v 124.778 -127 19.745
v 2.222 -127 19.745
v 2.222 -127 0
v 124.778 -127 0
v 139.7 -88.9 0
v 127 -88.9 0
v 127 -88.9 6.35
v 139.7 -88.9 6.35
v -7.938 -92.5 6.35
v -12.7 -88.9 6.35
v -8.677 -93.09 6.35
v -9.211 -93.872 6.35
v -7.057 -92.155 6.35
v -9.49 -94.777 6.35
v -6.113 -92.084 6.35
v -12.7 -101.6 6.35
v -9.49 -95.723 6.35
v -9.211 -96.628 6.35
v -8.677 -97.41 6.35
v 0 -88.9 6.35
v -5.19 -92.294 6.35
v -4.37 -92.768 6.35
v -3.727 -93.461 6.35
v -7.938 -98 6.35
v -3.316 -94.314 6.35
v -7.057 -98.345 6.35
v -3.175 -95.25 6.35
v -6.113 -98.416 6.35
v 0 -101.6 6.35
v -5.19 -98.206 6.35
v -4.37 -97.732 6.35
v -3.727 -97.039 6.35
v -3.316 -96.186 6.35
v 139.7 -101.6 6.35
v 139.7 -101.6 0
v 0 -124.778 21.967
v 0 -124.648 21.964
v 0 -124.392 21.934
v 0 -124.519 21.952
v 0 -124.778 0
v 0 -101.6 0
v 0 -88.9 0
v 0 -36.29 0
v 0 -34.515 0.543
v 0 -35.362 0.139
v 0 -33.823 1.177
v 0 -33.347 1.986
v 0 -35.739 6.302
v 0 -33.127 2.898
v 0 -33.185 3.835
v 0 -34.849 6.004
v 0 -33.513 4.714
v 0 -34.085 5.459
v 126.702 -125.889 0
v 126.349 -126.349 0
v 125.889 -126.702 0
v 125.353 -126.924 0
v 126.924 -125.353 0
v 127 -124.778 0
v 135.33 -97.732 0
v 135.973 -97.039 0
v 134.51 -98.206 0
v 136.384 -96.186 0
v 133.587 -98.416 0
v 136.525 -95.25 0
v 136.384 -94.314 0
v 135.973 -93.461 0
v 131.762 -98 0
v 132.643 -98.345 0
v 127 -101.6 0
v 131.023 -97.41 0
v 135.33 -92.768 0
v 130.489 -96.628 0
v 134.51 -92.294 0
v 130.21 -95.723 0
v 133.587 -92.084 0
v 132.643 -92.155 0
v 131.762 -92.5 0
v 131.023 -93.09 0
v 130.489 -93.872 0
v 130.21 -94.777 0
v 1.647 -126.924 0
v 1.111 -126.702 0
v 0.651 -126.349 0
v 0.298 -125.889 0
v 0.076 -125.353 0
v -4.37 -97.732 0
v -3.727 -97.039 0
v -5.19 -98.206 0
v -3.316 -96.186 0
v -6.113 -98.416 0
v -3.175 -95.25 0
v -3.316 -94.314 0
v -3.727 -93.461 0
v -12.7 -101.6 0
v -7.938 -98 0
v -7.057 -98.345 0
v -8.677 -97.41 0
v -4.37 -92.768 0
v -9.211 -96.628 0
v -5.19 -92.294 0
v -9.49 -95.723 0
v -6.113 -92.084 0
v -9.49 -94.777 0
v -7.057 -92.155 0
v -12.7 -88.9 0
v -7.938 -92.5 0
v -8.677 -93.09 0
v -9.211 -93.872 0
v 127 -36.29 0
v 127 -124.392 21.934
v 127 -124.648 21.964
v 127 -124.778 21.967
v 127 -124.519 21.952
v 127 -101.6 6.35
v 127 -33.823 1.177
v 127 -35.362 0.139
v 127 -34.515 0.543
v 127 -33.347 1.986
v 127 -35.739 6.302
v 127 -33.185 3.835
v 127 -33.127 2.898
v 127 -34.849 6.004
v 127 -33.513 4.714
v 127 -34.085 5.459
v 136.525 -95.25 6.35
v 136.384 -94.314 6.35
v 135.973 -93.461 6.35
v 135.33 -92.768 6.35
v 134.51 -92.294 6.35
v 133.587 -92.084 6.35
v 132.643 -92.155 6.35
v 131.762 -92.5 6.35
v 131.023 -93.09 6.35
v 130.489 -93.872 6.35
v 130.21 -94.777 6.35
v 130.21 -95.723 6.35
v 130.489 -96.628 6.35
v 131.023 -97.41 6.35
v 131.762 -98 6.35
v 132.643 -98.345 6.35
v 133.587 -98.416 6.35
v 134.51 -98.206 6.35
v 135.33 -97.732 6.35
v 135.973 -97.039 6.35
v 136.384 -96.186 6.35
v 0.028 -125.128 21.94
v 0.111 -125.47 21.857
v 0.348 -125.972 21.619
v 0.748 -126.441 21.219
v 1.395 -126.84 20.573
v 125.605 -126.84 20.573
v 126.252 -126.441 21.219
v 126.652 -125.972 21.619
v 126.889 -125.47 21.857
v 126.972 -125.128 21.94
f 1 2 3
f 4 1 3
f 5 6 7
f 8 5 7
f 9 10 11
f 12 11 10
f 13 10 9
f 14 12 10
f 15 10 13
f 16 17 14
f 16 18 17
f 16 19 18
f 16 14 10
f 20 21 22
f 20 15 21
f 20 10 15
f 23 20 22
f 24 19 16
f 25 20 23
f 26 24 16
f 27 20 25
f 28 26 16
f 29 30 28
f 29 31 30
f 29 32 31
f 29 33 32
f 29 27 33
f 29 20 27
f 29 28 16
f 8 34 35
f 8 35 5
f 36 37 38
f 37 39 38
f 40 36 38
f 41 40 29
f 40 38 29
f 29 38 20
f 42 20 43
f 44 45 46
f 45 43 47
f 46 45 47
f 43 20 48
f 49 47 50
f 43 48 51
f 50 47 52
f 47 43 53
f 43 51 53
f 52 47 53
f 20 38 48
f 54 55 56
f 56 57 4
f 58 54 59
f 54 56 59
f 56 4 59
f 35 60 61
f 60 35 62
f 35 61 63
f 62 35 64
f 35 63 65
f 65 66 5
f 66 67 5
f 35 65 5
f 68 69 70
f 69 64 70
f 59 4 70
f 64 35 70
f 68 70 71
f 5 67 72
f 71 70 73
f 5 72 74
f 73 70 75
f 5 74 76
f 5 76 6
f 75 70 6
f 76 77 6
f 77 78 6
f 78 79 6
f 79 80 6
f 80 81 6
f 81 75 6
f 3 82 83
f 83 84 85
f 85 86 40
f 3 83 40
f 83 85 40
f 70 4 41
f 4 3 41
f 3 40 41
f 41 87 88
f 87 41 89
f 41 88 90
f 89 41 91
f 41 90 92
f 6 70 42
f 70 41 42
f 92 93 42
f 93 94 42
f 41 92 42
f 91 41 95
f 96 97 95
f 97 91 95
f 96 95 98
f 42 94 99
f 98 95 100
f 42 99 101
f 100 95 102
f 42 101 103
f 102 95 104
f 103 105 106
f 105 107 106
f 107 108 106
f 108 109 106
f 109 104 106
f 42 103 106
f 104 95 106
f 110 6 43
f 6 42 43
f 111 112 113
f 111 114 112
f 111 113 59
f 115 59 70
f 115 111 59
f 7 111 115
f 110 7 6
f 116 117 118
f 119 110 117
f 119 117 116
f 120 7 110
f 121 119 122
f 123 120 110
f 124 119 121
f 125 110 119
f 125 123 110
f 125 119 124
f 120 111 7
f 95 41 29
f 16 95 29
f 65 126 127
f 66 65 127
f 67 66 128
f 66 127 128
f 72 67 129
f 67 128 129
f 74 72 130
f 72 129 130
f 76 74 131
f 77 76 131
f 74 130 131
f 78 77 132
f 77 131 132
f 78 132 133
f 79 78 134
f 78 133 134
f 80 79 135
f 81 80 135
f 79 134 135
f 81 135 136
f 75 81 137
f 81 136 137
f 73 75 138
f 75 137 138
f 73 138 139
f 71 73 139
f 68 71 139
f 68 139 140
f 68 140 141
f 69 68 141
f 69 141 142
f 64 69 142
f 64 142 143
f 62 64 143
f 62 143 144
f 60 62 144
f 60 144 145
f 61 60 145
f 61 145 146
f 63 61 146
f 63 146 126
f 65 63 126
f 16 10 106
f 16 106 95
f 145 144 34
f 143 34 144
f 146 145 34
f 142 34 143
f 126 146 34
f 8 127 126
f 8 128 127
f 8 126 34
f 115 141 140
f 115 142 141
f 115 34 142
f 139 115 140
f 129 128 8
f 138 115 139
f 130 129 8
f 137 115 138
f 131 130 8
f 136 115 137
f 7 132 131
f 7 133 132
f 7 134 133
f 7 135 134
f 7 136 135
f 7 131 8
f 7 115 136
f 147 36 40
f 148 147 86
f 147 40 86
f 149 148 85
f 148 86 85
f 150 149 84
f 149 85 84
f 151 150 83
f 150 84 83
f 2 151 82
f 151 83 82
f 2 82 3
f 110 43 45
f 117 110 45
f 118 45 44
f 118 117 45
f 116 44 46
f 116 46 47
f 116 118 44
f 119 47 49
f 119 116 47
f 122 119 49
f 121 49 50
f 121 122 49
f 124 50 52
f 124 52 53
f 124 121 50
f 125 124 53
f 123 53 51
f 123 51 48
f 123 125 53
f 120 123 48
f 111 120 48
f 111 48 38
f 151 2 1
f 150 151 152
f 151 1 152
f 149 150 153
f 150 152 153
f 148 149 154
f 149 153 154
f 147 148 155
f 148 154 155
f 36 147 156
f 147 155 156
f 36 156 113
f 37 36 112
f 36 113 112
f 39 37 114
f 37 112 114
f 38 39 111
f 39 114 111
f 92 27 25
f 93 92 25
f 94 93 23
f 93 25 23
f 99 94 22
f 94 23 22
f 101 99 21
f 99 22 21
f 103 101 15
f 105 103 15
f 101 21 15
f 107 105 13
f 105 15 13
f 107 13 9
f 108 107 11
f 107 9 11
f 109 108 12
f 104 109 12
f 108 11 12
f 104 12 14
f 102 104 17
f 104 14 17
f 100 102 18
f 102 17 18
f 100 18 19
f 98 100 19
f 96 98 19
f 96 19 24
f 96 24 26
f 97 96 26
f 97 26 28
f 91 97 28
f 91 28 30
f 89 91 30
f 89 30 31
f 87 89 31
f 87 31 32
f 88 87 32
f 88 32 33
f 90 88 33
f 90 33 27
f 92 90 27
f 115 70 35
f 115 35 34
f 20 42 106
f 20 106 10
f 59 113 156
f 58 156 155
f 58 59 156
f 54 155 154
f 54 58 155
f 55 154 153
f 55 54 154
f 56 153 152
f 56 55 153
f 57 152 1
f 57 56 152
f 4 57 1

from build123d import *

# Parameters (mm, degrees)
F1_DEPTH = 127
F2_W     = 12.7
F2_H     = 6.35
F3_DEPTH = 12.7
F4_W     = 12.7
F4_H     = 6.35
F5_DEPTH = 12.7
F6_R     = 3.175
F7_DEPTH = 6.351
F8_R     = 3.175
F9_DEPTH = 6.351
F10_R    = 3.175
F11_R    = 2.2225


with BuildPart() as f1:
    # F0 (on Right) → F1 (new body)
    with BuildSketch(Plane.YZ):
        Polygon((-127, 0), (0, 0), (-127, 22.393527), align=None)
    extrude(amount=F1_DEPTH)

    # F2 (on face) → F3 (join)
    with BuildSketch(Plane.YZ.offset(127)):
        with Locations((-95.25, 3.175)):
            Rectangle(F2_W, F2_H)
    extrude(amount=F3_DEPTH)

    # F4 (on face) → F5 (join)
    with BuildSketch(Plane(origin=(0, 0, 0), x_dir=(0, -1, 0), z_dir=(-1, 0, 0))):
        with Locations((95.25, 3.175)):
            Rectangle(F4_W, F4_H)
    extrude(amount=F5_DEPTH)

    # F6 (on face) → F7 (cut, through all)
    with BuildSketch(Plane.XY.offset(6.35)):
        with Locations((-6.35, -95.25)):
            Circle(F6_R)
    extrude(amount=-F7_DEPTH, mode=Mode.SUBTRACT)

    # F8 (on face) → F9 (cut, through all)
    with BuildSketch(Plane.XY.offset(6.35)):
        with Locations((133.35, -95.25)):
            Circle(F8_R)
    extrude(amount=-F9_DEPTH, mode=Mode.SUBTRACT)

    # F10
    f10_edges = [f1.edges().sort_by_distance(p)[0] for p in [
        (63.5, 0, 0),
    ]]
    fillet(f10_edges, radius=F10_R)

    # F11
    f11_edges = [f1.edges().sort_by_distance(p)[0] for p in [
        (63.5, -127, 22.393527),
        (127, -127, 11.196763),
        (0, -127, 11.196763),
    ]]
    fillet(f11_edges, radius=F11_R)


solid = f1.part
